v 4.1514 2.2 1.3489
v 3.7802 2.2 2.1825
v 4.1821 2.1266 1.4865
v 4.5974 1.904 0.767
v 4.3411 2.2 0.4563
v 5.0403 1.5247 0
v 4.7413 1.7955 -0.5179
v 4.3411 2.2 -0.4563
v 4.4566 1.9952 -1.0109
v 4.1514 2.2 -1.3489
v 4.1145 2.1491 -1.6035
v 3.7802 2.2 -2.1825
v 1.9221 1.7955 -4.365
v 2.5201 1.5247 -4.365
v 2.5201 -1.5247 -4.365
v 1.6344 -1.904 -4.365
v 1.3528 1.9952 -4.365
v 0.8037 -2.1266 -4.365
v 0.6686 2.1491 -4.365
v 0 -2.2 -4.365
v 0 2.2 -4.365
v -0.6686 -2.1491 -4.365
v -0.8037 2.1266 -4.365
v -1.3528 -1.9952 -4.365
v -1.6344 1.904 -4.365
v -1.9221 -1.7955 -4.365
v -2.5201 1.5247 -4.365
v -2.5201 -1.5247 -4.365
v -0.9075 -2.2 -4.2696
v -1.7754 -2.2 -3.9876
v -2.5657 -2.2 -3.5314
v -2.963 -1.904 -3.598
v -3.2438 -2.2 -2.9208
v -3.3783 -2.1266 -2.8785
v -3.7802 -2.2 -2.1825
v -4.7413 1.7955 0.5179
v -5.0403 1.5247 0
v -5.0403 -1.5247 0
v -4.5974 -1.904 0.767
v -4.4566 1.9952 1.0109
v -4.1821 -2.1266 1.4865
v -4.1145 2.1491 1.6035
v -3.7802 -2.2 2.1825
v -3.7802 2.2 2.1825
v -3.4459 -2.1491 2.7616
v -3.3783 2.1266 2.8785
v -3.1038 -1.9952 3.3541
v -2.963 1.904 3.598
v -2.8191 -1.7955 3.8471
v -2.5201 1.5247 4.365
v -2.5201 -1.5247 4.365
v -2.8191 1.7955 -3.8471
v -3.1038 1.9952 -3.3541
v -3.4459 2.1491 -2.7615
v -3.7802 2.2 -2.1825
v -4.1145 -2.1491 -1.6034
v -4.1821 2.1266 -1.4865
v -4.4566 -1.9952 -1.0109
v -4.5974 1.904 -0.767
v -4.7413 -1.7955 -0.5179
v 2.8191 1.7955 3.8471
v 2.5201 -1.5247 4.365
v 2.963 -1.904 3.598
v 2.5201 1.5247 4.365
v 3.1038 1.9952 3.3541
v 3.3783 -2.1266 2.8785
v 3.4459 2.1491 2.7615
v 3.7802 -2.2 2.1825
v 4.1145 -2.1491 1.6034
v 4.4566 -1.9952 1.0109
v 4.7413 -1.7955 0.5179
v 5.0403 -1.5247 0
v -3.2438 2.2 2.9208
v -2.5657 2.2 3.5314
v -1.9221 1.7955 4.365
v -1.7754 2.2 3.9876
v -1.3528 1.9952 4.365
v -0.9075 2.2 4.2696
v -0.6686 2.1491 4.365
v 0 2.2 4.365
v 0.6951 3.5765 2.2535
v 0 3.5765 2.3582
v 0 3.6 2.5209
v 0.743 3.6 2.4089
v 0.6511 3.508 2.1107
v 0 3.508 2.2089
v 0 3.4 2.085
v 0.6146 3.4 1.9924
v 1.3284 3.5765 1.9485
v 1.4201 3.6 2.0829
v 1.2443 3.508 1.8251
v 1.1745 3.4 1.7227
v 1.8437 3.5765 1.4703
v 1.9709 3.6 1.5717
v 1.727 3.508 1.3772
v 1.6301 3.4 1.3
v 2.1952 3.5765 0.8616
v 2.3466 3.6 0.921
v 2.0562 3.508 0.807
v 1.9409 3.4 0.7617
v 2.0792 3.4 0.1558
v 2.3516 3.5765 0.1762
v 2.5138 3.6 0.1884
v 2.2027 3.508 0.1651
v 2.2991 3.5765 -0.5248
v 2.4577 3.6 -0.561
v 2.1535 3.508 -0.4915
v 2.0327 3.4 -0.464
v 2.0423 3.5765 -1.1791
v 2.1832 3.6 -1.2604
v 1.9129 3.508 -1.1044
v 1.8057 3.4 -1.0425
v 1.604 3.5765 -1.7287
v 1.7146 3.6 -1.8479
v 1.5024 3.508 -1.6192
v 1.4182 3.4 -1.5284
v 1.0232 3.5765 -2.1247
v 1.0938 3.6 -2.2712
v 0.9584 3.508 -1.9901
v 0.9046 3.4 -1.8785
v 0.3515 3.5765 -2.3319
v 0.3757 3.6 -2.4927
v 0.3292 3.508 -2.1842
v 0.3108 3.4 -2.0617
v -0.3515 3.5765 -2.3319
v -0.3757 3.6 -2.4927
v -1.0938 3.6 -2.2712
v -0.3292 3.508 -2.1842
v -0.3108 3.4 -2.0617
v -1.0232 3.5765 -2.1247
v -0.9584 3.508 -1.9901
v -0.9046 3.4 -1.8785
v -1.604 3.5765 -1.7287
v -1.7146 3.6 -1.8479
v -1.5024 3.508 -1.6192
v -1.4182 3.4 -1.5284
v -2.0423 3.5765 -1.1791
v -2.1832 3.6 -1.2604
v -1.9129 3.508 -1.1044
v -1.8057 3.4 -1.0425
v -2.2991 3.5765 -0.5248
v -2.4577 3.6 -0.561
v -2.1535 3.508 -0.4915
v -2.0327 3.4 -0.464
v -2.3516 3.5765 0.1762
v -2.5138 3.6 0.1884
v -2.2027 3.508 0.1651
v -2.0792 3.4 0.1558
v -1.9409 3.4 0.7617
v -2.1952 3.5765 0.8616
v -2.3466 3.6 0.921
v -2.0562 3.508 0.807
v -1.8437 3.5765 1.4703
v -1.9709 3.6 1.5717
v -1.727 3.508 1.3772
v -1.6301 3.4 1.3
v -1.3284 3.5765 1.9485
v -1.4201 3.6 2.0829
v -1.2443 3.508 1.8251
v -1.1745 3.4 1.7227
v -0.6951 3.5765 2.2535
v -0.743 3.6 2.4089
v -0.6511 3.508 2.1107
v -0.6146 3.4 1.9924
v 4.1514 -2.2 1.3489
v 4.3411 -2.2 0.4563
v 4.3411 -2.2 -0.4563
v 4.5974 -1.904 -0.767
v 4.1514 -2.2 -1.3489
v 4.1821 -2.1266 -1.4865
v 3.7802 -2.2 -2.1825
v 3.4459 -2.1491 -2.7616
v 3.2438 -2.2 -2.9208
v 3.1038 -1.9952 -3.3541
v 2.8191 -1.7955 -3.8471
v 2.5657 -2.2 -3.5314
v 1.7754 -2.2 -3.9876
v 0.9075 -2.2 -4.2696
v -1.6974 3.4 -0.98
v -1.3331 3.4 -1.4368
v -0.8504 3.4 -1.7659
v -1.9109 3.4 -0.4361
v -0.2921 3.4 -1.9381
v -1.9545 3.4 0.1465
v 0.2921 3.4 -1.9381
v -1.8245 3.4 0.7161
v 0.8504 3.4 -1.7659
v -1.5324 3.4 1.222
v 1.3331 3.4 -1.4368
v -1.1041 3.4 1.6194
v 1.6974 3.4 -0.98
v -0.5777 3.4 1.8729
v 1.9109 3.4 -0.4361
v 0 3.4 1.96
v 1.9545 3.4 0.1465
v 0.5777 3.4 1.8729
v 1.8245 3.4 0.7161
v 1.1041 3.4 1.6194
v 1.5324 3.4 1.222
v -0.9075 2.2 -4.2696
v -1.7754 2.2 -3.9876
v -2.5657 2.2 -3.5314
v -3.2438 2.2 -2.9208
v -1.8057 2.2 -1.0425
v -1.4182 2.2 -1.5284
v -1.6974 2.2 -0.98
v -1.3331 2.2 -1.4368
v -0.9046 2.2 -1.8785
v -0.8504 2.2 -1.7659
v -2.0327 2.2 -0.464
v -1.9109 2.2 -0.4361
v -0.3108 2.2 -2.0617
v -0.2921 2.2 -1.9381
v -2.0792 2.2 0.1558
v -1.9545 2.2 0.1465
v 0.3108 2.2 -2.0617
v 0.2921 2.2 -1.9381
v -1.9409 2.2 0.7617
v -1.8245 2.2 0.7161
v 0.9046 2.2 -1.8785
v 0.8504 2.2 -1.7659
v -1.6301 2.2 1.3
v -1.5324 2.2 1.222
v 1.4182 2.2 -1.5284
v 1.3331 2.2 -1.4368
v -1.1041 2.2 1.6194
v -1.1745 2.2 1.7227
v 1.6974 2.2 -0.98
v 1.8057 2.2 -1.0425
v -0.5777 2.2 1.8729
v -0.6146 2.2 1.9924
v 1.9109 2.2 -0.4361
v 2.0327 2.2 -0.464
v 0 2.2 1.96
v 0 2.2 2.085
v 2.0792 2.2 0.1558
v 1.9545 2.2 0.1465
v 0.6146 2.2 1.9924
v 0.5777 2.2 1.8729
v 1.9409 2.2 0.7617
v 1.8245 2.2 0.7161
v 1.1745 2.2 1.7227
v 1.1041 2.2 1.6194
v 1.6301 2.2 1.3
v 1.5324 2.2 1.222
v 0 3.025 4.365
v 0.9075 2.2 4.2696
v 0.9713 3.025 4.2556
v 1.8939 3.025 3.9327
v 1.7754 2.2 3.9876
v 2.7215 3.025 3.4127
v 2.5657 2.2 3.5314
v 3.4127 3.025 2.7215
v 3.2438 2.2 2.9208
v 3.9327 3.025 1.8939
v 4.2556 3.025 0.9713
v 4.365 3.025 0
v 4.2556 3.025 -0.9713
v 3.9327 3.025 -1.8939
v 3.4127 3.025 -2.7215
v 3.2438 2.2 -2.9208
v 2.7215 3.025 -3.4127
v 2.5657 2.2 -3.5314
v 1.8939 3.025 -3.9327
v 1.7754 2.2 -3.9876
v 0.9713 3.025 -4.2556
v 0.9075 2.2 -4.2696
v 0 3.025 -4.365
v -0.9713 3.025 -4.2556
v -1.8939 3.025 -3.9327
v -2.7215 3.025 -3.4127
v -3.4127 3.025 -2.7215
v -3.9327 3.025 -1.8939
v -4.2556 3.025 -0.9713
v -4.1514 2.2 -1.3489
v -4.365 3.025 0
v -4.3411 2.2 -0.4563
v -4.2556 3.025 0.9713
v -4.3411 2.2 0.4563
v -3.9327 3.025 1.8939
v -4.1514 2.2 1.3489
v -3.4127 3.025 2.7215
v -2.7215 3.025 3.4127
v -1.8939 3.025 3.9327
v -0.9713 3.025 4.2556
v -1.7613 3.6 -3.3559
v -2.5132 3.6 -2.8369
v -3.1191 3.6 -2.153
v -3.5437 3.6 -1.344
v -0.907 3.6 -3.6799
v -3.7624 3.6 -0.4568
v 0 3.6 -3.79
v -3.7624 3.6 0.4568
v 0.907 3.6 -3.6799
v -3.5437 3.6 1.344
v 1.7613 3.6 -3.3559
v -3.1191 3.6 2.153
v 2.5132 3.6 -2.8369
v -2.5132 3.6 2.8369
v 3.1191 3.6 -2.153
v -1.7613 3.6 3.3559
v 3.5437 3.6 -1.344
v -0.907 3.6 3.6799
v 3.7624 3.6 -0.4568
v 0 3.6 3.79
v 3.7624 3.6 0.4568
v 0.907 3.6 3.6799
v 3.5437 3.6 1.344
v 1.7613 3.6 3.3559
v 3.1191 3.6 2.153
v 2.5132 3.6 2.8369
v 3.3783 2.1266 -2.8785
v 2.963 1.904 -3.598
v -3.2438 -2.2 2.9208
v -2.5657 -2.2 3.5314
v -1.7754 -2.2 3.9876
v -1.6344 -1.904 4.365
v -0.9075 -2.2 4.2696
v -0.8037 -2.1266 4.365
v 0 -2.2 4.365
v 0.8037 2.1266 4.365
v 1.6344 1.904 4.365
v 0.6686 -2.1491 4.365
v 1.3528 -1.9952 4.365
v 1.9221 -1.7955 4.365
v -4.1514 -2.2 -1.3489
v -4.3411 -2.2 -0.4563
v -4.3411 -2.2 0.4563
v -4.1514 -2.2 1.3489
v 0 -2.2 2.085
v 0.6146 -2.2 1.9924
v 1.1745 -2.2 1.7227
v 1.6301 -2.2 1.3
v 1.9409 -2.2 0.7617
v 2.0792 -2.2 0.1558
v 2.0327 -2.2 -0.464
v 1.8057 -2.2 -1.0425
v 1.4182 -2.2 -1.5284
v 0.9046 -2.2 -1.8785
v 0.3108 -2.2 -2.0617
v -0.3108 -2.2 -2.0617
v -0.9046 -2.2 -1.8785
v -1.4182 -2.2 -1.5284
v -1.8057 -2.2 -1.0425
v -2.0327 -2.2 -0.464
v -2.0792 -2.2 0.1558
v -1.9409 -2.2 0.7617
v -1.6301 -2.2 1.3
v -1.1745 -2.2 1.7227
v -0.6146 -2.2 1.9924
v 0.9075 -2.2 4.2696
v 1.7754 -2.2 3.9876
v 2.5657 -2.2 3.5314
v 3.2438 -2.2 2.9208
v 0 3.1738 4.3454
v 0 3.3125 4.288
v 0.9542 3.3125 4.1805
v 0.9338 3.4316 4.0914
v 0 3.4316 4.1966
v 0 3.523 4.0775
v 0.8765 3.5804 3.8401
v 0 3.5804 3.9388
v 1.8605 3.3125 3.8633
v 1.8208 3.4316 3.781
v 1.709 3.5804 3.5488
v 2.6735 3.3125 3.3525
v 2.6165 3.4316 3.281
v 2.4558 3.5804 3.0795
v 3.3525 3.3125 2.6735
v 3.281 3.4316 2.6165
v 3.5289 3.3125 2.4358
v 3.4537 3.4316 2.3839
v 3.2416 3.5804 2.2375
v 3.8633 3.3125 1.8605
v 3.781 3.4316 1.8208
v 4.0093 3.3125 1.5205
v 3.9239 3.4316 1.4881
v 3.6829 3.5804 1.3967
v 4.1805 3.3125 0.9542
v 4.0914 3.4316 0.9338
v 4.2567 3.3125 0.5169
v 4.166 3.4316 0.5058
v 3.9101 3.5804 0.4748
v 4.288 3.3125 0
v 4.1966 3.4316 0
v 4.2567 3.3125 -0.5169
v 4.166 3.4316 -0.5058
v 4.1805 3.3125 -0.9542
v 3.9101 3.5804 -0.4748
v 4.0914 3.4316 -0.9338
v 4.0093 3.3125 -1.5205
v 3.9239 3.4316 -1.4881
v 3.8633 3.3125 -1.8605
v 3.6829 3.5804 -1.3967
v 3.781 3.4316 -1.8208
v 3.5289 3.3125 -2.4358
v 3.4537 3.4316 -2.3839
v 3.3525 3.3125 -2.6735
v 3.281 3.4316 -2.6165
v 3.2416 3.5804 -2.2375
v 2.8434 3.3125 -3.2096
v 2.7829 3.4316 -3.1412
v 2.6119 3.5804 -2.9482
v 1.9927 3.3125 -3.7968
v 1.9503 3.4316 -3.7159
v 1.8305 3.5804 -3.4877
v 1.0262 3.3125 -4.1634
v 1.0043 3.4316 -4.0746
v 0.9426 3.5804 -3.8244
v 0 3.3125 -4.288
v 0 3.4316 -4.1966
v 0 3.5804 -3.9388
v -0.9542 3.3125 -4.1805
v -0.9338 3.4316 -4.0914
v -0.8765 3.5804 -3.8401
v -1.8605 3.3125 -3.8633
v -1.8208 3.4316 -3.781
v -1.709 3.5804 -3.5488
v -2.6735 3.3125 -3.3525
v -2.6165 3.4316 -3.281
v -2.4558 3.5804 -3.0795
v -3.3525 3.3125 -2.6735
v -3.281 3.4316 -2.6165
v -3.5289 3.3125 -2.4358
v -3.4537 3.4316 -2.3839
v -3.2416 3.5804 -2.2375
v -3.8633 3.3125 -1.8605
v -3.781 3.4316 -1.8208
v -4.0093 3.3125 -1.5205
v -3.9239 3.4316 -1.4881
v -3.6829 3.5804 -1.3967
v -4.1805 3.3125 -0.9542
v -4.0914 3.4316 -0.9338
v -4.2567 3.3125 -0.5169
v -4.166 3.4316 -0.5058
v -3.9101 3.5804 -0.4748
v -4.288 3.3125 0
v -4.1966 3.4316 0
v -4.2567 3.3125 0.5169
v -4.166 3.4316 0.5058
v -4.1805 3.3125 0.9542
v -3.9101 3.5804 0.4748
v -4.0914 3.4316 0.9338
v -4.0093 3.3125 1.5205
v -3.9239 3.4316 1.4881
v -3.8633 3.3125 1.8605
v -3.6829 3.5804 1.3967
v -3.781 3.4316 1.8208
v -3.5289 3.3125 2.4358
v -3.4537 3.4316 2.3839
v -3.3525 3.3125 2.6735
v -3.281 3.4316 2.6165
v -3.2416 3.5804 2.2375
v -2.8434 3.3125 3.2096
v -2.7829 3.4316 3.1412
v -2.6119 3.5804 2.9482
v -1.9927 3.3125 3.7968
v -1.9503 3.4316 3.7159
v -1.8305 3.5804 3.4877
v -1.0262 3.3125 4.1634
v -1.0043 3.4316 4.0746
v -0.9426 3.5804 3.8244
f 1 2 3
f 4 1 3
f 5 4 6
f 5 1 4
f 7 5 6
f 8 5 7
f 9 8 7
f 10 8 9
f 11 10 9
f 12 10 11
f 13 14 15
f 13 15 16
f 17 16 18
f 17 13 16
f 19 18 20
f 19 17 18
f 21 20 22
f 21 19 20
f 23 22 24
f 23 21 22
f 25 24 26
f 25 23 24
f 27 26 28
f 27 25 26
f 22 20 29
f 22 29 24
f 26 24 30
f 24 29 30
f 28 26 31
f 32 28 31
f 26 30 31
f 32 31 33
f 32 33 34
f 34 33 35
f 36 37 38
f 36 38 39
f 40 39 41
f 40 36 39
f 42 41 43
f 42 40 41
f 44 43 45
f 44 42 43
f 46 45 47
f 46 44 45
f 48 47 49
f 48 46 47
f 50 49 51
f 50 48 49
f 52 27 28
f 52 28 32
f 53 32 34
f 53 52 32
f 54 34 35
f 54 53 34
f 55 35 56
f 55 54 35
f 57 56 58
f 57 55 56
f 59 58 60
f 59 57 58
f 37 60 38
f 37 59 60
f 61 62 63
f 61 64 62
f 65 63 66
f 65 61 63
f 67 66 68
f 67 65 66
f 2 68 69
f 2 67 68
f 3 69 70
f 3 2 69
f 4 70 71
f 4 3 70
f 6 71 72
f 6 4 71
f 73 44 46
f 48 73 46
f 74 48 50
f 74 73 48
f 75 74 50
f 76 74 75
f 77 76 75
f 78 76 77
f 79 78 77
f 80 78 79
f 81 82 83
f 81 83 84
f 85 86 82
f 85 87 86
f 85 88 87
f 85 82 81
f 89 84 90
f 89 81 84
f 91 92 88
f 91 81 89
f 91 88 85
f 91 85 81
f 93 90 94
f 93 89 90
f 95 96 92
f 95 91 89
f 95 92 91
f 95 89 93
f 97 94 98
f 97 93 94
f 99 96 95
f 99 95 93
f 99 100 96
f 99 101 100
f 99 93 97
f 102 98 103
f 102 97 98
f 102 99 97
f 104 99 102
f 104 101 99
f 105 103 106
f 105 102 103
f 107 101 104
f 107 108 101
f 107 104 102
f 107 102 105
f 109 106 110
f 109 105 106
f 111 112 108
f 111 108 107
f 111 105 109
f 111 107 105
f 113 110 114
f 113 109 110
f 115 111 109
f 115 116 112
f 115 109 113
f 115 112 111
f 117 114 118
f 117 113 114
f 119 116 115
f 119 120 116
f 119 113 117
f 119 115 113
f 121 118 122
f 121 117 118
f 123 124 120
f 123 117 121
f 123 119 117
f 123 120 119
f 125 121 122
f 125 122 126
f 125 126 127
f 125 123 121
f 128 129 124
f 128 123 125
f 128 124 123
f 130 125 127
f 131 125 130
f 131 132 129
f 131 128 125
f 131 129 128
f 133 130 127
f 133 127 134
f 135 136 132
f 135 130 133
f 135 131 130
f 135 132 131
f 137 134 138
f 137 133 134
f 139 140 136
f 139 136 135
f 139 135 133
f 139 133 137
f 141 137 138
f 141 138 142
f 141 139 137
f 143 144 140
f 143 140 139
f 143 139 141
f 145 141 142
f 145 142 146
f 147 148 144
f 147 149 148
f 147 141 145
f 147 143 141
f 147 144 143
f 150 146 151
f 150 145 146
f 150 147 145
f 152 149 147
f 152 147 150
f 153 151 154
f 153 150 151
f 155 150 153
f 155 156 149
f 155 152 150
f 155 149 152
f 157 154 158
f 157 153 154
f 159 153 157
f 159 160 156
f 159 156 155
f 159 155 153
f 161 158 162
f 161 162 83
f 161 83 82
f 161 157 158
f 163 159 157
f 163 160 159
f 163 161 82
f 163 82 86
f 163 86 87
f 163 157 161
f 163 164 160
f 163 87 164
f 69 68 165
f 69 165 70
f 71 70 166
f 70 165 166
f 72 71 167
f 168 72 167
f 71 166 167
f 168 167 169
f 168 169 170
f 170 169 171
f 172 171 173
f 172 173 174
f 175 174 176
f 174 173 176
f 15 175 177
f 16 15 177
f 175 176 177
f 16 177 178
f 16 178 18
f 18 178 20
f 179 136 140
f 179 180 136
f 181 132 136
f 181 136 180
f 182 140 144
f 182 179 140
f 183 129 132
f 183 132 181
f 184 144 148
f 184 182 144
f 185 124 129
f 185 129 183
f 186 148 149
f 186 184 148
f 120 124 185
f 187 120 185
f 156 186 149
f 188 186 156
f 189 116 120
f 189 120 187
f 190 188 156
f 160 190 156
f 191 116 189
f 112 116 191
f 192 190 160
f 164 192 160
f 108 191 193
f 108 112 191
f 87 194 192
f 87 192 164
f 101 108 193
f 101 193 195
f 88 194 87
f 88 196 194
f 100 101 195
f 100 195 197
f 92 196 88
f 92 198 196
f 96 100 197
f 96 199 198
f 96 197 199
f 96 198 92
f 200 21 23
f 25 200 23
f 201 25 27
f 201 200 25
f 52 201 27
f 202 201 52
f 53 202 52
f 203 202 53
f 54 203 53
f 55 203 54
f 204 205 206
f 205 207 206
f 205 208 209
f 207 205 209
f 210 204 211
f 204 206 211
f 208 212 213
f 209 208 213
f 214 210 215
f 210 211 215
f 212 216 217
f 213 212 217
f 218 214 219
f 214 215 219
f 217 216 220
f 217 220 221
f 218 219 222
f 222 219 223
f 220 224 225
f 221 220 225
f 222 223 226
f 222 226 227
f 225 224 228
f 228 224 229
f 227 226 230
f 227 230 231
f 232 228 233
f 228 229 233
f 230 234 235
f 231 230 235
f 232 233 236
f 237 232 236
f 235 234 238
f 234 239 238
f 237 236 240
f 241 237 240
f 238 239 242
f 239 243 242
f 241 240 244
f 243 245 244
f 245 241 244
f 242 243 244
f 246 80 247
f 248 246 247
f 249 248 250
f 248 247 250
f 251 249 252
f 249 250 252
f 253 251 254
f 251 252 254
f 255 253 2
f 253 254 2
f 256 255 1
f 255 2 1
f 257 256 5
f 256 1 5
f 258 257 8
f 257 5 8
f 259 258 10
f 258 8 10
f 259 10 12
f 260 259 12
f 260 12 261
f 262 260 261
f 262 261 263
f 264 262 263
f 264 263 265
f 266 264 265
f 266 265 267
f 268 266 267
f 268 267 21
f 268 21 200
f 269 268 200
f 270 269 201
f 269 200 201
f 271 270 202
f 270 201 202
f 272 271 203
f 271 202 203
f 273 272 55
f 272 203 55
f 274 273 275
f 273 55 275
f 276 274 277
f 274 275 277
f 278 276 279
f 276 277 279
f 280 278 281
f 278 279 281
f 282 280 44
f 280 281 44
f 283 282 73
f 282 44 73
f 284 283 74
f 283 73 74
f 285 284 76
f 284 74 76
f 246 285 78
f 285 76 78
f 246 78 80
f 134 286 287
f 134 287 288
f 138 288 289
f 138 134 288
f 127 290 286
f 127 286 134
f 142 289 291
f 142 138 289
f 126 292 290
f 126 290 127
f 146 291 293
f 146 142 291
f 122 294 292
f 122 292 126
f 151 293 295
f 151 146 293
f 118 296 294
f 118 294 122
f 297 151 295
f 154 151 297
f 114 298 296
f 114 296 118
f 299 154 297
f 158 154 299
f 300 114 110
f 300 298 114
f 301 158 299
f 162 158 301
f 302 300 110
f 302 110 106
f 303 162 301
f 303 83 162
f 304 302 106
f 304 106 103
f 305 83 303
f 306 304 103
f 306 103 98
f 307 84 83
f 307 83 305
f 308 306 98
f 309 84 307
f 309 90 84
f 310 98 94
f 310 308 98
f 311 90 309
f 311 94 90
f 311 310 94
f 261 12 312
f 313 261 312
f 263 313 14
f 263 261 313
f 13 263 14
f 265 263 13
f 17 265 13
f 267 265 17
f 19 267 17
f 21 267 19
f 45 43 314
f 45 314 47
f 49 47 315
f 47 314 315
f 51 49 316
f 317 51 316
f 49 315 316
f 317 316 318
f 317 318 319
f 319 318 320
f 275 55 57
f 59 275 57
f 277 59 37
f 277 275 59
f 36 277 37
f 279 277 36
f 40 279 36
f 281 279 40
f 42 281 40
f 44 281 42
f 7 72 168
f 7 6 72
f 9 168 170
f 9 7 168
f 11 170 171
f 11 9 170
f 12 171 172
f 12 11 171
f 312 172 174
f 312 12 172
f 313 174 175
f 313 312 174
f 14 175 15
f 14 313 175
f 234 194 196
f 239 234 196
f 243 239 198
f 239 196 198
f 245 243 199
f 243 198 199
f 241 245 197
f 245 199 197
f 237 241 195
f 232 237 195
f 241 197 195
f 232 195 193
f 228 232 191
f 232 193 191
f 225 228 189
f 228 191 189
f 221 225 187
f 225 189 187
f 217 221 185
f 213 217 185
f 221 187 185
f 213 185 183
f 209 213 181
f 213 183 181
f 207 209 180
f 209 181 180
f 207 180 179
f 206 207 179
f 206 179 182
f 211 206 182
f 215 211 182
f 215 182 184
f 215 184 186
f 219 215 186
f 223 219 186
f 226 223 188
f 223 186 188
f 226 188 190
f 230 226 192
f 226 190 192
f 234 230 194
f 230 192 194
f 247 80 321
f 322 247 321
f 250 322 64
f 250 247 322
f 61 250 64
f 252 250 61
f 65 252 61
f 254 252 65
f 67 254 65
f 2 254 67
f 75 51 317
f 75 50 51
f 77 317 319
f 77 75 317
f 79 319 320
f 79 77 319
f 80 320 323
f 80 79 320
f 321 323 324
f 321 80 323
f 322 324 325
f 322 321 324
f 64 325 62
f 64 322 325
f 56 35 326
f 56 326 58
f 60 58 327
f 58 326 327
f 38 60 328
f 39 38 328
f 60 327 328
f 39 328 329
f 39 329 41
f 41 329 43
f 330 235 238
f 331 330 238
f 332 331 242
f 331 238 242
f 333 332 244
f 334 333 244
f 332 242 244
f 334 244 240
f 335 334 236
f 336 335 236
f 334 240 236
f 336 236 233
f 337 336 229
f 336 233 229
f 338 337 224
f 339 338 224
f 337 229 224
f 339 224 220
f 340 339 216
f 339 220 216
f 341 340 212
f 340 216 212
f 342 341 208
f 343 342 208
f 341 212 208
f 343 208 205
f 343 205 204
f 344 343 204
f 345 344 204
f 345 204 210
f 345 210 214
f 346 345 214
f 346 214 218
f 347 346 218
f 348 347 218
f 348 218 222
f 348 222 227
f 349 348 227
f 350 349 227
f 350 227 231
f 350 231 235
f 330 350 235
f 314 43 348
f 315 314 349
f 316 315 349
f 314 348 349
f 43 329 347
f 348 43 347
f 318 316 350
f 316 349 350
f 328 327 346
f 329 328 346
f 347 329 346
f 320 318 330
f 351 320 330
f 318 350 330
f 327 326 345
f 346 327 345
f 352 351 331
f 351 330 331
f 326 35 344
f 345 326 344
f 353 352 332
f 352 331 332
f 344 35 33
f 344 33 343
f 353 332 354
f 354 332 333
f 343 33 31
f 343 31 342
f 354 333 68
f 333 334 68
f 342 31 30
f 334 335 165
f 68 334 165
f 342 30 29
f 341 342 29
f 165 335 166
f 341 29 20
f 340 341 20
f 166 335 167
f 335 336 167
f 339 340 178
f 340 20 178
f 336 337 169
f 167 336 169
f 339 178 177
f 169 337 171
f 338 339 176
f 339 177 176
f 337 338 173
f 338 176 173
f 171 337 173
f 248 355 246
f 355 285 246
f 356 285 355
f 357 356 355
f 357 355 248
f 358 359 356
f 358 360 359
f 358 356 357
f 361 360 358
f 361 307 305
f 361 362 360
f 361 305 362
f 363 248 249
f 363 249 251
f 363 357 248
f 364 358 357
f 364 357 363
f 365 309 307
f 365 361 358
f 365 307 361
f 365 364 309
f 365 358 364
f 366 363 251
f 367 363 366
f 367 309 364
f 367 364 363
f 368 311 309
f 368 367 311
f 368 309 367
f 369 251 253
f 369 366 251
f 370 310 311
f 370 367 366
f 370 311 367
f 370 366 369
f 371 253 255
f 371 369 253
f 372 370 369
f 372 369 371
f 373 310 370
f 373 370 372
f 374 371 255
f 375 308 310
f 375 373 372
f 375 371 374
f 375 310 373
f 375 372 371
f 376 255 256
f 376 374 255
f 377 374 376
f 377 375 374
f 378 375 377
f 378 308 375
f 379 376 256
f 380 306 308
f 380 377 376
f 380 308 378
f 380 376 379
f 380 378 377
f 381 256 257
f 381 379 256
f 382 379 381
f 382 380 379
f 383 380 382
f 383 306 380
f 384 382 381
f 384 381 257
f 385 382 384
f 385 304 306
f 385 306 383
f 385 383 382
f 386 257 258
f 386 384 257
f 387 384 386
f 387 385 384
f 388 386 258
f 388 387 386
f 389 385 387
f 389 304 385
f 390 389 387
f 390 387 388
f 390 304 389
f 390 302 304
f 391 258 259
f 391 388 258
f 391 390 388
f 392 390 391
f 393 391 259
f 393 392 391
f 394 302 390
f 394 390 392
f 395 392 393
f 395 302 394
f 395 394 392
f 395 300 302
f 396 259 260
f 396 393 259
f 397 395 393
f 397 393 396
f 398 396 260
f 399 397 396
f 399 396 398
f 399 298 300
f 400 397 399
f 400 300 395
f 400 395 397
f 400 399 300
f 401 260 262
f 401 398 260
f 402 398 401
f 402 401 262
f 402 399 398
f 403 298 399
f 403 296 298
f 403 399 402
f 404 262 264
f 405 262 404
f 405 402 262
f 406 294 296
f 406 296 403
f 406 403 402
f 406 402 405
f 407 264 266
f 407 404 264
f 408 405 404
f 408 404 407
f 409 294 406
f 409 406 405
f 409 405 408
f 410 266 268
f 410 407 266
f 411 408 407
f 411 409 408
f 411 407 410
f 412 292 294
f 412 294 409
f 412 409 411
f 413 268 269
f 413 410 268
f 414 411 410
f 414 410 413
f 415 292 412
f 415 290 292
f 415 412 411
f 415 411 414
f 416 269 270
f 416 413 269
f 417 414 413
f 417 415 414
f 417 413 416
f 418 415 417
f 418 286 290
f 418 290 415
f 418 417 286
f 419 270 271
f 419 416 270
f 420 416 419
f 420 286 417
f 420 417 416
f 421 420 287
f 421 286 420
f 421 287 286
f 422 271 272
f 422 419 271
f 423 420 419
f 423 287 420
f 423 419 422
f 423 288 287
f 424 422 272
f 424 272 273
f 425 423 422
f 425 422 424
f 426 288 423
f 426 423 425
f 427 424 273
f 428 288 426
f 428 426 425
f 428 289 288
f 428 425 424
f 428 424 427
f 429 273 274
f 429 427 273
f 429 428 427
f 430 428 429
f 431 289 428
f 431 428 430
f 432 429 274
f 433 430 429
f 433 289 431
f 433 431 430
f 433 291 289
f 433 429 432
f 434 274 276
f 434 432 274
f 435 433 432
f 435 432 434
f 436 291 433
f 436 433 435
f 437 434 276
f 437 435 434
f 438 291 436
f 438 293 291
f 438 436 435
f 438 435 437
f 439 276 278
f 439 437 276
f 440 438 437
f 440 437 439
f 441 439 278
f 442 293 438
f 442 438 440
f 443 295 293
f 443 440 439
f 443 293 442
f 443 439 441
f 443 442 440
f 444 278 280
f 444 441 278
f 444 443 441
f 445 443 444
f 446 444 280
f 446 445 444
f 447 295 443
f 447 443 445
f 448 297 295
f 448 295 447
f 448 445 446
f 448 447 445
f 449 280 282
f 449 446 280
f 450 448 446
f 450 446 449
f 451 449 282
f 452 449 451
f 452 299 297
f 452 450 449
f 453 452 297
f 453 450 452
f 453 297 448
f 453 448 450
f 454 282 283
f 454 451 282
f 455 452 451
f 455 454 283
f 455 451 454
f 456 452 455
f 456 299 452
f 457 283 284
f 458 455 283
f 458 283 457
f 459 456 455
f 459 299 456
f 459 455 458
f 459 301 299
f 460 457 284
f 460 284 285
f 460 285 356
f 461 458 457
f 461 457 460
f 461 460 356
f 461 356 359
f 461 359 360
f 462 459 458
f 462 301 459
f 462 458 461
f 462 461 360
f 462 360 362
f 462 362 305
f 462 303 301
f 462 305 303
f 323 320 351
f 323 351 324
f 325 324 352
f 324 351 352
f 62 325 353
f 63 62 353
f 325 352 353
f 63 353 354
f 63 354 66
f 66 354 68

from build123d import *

# Parameters (mm, degrees)
EXTRUDE_1_DEPTH     = 2.2
SKETCH_3_R          = 4.365
EXTRUDE_2_DEPTH     = 1.4
SKETCH_4_R          = 2.085
CUT_EXTRUDE_1_DEPTH = 9.837280407
EXTRUDE_START       = -0.2
SKETCH_5_R          = 2.085
SKETCH_5_R_2        = 1.96
EXTRUDE_3_DEPTH     = 1.2
FILLET_1_R          = 0.575


with BuildPart() as part:
    # 草图1 → 凸台-拉伸1 (new, symmetric)
    with BuildSketch(Plane(origin=(0, 0, 0), x_dir=(1, 0, 0), z_dir=(0, 1, 0))):
        Polygon((5.04026785, 0), (2.520133925, 4.365), (-2.520133925, 4.365), (-5.04026785, 0), (-2.520133925, -4.365), (2.520133925, -4.365), align=None)
    extrude(amount=EXTRUDE_1_DEPTH, both=True)

    # 草图3 → 凸台-拉伸2 (add)
    with BuildSketch(Plane(origin=(0, 2.2, 0), x_dir=(1, 0, 0), z_dir=(0, 1, 0))):
        with Locations(Location((0, 0, 0), (0, 0, 270))):
            Circle(SKETCH_3_R)
    extrude(amount=EXTRUDE_2_DEPTH)

    # 草图4 → 切除-拉伸1 (cut, through all)
    with BuildSketch(Plane(origin=(0, 3.6, 0), x_dir=(1, 0, 0), z_dir=(0, 1, 0))):
        with Locations(Location((0, 0, 0), (0, 0, 270))):
            Circle(SKETCH_4_R)
    extrude(amount=-CUT_EXTRUDE_1_DEPTH, mode=Mode.SUBTRACT)

    # 草图5 → 凸台-拉伸3 (add)
    with BuildSketch(Plane(origin=(0, 3.6, 0), x_dir=(1, 0, 0), z_dir=(0, 1, 0)).offset(EXTRUDE_START)):
        with Locations(Location((0, 0, 0), (0, 0, 270))):
            Circle(SKETCH_5_R)
        with Locations(Location((0, 0, 0), (0, 0, 270))):
            Circle(SKETCH_5_R_2, mode=Mode.SUBTRACT)
    extrude(amount=-EXTRUDE_3_DEPTH)

    # 圆角1
    # the kernel refuses this fillet: 0.575 mm, written as the material it takes off along each edge
    with BuildSketch(Plane(origin=(0, 3.6, 0), x_dir=(0, 0, 1), z_dir=(-1, 0, 0))) as fillet_1_piece_1:
        with BuildLine():
            CenterArc((4.365 - FILLET_1_R, -FILLET_1_R), FILLET_1_R, 0, 90)
            Line((4.365 - FILLET_1_R, 0), (4.365 - FILLET_1_R, FILLET_1_R * 0.02))
            Line((4.365 - FILLET_1_R, FILLET_1_R * 0.02), (4.365 + FILLET_1_R * 0.02, FILLET_1_R * 0.02))
            Line((4.365 + FILLET_1_R * 0.02, FILLET_1_R * 0.02), (4.365 + FILLET_1_R * 0.02, -FILLET_1_R))
            Line((4.365 + FILLET_1_R * 0.02, -FILLET_1_R), (4.365, -FILLET_1_R))
        make_face()
    revolve(axis=Axis((0, 3.6, 0), (0, 1, 0)), mode=Mode.SUBTRACT)
    with BuildSketch(Plane(origin=(0, 3.6, 0), x_dir=(0, 0, 1), z_dir=(-1, 0, 0))) as fillet_1_piece_2:
        with BuildLine():
            CenterArc((2.520889894, -0.575), FILLET_1_R, 90, 49.294293169)
            Line((2.085, -0.2), (2.076282202, -0.1925))
            ThreePointArc((2.076282202, -0.1925), (2.0735, -0.1), (2.0735, 0))
            Line((2.0735, 0), (2.085, 0.0115))
            Line((2.085, 0.0115), (2.520889894, 0.0115))
            Line((2.520889894, 0.0115), (2.520889894, 0))
        make_face()
    revolve(axis=Axis((0, 3.6, 0), (0, 1, 0)), mode=Mode.SUBTRACT)

    # 草图6 → 切除-旋转1 (revolve, cut)
    with BuildSketch(Plane.XY):
        Polygon((-5.04026785, 2.2), (-5.04026785, 1.52473215), (-4.365, 2.2), align=None)
        Polygon((-5.04026785, -2.2), (-5.04026785, -1.52473215), (-4.365, -2.2), align=None)
    revolve(axis=Axis((0, -1000, 0), (0, 1, 0)), mode=Mode.SUBTRACT)


solid = part.part
